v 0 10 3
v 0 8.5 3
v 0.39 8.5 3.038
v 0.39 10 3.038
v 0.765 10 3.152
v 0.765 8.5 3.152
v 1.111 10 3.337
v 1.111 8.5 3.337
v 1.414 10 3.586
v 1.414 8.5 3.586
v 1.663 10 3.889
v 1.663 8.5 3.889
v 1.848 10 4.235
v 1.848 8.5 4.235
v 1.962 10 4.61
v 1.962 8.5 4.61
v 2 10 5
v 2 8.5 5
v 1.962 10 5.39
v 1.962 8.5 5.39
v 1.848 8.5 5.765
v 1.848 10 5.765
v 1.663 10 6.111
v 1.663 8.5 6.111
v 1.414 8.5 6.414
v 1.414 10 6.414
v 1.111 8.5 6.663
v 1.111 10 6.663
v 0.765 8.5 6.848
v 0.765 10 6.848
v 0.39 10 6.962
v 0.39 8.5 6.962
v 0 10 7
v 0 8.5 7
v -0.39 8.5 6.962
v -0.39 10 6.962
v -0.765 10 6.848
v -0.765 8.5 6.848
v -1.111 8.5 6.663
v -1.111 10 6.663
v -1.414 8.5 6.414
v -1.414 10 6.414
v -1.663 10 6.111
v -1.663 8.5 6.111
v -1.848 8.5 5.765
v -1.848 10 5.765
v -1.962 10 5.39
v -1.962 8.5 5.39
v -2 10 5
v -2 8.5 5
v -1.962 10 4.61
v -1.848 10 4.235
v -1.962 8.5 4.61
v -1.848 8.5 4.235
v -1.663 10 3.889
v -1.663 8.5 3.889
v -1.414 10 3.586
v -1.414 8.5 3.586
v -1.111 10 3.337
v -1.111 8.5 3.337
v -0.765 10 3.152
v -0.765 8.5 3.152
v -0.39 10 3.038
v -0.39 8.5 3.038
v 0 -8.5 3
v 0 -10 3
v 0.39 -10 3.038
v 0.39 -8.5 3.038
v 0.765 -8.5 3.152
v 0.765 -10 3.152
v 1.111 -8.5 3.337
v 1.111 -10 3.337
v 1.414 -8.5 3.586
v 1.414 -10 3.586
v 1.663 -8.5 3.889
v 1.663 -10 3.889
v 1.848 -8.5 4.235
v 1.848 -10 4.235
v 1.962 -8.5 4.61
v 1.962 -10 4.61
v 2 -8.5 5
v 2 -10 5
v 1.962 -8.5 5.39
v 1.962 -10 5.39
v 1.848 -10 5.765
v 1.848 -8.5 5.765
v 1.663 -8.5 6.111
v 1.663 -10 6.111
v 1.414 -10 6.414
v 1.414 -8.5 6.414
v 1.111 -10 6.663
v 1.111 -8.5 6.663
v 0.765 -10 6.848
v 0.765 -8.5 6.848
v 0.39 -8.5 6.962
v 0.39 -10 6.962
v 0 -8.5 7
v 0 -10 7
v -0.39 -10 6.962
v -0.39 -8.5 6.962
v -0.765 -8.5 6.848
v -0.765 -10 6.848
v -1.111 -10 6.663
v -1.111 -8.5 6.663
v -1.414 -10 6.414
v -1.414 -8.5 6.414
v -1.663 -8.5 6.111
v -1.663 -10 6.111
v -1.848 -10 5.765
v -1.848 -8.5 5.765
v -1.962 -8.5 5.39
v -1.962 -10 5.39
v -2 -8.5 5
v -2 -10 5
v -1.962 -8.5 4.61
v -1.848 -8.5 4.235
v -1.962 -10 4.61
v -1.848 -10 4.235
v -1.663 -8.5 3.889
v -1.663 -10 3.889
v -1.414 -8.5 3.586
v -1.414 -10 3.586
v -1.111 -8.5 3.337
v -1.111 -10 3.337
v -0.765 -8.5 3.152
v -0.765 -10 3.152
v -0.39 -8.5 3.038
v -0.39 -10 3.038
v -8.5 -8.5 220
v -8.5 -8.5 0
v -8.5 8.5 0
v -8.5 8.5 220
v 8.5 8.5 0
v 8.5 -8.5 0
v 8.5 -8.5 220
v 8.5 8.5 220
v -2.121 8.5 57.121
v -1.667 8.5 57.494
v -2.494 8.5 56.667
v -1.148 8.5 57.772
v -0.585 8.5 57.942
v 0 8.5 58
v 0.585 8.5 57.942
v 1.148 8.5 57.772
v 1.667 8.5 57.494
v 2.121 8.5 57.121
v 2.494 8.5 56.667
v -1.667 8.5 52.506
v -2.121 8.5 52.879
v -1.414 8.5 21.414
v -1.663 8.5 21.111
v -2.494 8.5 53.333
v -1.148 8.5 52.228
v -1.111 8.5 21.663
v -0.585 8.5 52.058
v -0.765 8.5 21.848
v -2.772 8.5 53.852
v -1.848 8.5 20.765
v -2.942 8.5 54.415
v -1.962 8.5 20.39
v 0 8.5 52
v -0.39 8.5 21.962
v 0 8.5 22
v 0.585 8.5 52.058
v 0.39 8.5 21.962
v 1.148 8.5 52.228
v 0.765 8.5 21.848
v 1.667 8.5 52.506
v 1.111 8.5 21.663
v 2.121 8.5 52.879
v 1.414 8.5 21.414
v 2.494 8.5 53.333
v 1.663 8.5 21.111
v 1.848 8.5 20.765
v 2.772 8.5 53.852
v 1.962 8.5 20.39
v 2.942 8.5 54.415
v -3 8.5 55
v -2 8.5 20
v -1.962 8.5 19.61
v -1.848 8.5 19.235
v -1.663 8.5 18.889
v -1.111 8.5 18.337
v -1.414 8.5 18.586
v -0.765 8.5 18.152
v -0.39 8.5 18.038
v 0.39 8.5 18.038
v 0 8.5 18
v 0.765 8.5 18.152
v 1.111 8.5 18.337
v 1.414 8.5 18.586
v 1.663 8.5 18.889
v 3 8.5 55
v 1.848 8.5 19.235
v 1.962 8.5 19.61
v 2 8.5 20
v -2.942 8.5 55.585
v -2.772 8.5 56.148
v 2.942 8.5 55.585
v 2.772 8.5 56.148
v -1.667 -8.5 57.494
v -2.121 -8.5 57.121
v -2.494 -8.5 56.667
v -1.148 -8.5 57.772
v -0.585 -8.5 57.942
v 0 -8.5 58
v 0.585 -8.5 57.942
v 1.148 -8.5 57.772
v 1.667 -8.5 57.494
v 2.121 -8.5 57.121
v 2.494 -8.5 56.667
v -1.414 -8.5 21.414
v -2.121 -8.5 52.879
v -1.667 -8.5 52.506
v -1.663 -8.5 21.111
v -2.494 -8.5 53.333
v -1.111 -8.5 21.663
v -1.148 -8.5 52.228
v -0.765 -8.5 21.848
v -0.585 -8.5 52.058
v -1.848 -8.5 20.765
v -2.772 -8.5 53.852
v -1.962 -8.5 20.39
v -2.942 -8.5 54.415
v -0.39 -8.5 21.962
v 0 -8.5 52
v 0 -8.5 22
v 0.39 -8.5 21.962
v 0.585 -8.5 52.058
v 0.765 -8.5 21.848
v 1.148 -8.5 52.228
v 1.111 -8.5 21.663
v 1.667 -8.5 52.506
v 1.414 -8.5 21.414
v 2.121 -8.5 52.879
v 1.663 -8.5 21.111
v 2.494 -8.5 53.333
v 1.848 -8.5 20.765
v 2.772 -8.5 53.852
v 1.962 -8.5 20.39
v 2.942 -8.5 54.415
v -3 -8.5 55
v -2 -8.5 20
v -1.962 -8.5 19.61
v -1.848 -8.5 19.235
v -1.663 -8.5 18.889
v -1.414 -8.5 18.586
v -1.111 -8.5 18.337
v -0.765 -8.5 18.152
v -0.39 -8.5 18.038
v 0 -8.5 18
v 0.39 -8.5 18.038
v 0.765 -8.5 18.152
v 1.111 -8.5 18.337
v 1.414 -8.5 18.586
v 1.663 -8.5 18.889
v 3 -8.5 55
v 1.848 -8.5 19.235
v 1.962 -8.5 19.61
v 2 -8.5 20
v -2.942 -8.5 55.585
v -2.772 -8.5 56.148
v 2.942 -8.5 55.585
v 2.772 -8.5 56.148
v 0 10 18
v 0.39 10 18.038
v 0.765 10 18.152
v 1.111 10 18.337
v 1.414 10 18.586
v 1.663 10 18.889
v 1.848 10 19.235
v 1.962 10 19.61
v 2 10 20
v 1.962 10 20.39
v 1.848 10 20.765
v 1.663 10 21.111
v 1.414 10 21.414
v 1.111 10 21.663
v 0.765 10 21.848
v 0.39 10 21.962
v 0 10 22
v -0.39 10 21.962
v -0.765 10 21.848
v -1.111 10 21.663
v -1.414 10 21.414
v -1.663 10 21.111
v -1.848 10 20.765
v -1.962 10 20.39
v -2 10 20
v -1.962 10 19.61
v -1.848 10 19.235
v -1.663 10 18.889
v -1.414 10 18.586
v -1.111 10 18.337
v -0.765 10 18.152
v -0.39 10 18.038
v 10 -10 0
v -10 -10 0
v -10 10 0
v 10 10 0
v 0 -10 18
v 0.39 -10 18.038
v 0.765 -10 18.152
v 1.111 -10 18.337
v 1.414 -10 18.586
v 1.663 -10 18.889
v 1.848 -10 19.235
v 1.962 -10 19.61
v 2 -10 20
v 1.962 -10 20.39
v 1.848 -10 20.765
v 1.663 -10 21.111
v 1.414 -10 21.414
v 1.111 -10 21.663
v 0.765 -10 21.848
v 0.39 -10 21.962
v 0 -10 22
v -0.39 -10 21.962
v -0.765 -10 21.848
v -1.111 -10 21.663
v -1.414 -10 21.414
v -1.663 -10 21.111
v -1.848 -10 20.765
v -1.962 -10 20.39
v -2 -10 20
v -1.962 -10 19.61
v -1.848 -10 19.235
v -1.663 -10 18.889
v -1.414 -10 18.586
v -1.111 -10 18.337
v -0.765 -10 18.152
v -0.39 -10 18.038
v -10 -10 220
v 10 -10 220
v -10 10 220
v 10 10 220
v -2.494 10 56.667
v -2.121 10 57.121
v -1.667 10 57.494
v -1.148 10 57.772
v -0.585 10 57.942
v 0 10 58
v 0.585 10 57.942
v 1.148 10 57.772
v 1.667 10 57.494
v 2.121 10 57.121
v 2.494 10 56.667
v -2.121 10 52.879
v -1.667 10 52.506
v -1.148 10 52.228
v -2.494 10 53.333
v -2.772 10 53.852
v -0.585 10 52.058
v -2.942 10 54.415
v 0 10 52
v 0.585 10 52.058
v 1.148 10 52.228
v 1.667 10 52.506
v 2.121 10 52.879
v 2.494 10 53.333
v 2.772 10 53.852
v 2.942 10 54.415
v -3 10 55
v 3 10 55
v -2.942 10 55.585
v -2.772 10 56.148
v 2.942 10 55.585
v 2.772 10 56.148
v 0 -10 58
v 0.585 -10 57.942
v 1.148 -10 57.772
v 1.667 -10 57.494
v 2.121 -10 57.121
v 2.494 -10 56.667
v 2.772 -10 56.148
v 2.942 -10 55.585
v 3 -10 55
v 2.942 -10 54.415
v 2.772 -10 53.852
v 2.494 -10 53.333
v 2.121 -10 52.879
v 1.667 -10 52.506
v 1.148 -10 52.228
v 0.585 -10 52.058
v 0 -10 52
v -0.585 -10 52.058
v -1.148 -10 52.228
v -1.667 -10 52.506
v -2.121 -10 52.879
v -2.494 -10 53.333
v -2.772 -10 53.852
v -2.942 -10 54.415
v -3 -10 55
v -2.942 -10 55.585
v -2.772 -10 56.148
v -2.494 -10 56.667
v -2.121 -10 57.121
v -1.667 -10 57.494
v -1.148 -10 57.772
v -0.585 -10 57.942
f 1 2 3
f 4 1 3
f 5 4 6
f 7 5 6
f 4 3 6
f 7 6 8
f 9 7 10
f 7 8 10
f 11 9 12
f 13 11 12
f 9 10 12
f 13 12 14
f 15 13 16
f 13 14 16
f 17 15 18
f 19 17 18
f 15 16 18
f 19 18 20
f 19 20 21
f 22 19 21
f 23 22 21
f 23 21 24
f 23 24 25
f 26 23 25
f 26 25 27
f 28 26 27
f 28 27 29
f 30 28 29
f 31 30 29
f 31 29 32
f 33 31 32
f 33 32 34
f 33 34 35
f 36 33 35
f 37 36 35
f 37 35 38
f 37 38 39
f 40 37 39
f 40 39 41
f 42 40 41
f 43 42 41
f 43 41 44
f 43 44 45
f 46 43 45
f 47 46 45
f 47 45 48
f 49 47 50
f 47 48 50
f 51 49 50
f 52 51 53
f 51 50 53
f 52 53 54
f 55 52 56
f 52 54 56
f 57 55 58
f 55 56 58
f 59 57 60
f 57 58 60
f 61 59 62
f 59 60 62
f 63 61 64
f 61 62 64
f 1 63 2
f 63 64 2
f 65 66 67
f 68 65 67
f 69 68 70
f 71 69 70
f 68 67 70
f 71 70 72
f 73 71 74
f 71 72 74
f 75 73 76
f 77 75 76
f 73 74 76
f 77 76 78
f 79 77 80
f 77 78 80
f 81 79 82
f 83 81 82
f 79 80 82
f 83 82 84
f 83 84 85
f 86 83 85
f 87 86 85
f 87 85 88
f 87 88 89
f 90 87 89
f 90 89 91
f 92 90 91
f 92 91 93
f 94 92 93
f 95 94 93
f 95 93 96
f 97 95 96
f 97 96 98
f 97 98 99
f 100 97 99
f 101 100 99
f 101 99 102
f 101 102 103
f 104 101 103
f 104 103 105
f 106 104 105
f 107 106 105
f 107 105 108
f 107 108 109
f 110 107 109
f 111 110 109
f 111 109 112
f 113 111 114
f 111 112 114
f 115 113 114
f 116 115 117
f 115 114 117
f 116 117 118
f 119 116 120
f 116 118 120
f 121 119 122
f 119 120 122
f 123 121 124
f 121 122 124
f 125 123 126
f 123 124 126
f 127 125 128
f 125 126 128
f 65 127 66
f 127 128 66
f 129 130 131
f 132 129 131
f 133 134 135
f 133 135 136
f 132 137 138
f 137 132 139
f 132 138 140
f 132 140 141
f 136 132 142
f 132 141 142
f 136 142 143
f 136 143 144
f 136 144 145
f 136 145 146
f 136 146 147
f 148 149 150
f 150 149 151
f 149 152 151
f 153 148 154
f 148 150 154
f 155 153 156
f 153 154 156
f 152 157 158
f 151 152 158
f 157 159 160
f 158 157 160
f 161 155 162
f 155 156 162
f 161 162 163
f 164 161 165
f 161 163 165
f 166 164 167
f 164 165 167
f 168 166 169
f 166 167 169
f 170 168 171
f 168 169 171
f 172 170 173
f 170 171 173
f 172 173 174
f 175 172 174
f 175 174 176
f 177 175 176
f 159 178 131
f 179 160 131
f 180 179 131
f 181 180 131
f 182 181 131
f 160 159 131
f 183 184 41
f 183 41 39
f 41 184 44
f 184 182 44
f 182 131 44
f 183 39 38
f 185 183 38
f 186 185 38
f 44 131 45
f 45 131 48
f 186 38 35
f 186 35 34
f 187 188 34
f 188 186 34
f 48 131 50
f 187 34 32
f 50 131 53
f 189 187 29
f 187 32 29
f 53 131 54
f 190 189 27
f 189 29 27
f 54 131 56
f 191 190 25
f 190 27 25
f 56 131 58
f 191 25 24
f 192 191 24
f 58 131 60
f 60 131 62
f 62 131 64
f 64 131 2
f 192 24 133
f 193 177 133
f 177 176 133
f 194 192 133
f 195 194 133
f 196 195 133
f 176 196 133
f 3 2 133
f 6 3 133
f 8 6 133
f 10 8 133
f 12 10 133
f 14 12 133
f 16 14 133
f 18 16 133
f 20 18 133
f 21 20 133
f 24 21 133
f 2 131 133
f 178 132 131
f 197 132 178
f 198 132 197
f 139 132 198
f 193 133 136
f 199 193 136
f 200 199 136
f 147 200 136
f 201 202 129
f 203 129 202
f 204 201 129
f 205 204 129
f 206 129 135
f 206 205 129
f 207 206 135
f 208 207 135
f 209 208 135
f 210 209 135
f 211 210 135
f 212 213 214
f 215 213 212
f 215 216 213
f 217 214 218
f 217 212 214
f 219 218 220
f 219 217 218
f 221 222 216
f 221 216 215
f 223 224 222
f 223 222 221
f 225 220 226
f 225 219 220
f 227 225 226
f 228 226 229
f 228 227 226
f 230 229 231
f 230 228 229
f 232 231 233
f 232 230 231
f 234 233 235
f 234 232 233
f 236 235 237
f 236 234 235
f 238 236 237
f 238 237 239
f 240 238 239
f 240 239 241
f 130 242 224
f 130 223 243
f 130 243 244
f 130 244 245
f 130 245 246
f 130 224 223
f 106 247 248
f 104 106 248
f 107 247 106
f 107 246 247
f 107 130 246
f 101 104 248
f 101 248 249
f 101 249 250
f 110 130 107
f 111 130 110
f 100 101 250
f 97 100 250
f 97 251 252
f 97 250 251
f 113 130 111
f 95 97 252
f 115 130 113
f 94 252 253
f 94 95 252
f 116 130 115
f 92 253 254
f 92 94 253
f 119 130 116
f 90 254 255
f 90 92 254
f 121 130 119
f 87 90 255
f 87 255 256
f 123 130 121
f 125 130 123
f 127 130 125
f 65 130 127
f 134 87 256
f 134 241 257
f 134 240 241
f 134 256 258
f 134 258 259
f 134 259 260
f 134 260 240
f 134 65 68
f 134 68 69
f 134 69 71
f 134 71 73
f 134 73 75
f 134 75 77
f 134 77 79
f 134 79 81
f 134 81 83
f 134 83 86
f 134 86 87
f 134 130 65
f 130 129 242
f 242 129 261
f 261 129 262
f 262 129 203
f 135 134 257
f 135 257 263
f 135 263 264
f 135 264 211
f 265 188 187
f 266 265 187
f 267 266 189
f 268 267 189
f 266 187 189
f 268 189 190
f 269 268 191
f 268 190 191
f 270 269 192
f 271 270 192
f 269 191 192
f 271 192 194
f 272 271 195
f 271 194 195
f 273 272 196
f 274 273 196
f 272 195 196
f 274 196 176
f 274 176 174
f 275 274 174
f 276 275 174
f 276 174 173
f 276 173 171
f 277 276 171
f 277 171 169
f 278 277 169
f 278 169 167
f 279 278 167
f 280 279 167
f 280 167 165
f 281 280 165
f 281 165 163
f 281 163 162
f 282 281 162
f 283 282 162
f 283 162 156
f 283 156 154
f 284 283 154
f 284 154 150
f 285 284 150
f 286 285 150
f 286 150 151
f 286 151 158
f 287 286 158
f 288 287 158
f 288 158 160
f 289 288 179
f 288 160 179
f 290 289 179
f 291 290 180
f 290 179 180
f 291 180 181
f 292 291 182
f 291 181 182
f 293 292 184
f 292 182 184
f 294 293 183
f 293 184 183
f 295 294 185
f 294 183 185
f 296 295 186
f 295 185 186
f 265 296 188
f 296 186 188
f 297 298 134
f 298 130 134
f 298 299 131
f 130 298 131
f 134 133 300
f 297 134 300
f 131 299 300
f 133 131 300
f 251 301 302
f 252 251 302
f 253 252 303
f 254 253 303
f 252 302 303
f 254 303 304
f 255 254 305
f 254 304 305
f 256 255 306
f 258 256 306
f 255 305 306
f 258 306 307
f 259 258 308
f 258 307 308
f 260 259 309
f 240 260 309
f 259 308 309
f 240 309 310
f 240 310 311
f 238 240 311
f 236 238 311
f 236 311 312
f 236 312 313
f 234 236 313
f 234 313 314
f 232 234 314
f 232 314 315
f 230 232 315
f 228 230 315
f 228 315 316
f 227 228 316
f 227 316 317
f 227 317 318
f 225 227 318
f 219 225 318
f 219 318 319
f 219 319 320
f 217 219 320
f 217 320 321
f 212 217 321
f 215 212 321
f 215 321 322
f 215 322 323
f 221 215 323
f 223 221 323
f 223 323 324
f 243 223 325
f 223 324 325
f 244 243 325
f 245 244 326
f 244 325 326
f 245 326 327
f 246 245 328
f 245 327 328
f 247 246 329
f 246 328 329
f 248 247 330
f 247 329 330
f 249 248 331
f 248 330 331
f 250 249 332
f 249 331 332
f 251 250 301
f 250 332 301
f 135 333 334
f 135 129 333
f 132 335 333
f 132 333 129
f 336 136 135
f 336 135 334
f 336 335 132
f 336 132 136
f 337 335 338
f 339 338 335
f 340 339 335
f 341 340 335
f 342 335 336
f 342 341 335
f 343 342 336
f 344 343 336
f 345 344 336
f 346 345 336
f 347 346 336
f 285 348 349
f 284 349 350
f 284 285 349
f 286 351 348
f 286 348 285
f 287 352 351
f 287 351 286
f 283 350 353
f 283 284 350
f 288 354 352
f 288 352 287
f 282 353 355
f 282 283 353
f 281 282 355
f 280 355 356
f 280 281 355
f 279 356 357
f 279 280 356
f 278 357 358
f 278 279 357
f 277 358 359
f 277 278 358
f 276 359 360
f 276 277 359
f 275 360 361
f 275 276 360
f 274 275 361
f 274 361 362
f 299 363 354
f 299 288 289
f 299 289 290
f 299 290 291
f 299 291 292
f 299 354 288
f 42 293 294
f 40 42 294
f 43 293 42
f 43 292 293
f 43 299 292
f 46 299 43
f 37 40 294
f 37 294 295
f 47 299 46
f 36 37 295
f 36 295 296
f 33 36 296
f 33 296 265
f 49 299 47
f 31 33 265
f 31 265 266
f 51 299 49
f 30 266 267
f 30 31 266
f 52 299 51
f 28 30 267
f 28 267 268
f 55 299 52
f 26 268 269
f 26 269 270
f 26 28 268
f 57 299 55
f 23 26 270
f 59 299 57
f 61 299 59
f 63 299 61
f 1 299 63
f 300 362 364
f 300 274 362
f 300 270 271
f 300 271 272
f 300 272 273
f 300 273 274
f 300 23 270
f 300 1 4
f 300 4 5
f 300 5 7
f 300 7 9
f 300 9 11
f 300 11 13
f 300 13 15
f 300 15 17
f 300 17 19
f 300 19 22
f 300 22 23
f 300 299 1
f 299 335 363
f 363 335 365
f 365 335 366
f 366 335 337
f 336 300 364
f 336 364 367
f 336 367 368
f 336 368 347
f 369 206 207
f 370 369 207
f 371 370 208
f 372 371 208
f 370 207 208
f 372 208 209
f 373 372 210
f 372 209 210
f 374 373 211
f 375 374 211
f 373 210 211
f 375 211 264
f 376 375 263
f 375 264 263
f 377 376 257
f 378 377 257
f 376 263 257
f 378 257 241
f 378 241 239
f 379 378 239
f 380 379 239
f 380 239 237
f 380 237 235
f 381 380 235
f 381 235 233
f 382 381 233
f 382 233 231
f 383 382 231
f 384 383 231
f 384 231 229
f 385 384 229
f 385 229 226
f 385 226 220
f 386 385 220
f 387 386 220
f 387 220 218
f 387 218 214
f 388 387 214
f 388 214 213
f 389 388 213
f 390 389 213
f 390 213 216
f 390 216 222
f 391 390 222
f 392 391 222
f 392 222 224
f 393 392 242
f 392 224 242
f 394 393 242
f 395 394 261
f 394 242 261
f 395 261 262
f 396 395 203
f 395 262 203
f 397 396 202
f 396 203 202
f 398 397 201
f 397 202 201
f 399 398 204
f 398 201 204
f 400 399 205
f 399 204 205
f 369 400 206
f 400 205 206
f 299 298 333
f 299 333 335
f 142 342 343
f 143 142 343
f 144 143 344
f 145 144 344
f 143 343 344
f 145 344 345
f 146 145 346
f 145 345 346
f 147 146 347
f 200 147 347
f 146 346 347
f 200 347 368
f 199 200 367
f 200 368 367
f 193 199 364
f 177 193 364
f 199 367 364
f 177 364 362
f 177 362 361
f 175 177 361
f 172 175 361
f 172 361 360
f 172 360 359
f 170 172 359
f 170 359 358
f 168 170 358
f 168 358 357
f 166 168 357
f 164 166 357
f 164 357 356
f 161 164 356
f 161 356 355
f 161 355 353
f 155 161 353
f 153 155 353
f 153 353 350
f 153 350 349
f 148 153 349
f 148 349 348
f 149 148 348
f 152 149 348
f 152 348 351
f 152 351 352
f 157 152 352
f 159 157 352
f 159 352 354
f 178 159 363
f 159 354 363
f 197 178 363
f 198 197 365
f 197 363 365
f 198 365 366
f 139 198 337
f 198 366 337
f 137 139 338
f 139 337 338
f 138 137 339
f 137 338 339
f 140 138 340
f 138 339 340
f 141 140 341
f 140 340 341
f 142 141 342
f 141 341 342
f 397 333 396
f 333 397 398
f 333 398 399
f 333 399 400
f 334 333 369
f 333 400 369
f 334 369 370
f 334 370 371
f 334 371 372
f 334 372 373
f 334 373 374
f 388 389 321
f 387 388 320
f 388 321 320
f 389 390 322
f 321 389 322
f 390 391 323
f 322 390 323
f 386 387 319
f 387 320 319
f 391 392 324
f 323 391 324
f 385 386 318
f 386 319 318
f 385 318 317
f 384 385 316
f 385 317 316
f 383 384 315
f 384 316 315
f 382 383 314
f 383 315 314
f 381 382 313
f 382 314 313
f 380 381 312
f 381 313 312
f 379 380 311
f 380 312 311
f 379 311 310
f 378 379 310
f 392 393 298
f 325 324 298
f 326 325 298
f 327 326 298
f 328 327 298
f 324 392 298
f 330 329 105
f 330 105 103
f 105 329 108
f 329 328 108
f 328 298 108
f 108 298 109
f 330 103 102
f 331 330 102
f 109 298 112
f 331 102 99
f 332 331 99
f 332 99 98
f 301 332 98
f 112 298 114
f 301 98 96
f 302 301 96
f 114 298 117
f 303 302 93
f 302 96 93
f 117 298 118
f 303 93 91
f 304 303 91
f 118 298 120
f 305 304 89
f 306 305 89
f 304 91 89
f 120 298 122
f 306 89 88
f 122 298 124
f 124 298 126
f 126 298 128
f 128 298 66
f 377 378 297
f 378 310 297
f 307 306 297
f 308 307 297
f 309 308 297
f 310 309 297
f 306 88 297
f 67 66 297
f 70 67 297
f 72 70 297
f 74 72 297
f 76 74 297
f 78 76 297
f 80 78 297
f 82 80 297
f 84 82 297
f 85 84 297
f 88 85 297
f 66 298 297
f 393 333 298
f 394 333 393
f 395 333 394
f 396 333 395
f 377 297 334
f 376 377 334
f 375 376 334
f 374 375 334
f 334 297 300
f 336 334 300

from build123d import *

# Parameters (mm, degrees)
SKETCH_1_W          = 20
SKETCH_1_H          = 20
SKETCH_1_W_2        = 17
SKETCH_1_H_2        = 17
EXTRUDE_1_DEPTH     = 220
SKETCH_3_R          = 2
CUT_EXTRUDE_1_DEPTH = 23
SKETCH_4_R          = 3
CUT_EXTRUDE_2_DEPTH = 222.133443875


with BuildPart() as part:
    # 草图1 → 凸台-拉伸1 (new body)
    with BuildSketch(Plane.XY):
        Rectangle(SKETCH_1_W, SKETCH_1_H)
        Rectangle(SKETCH_1_W_2, SKETCH_1_H_2, mode=Mode.SUBTRACT)
    extrude(amount=EXTRUDE_1_DEPTH)

    # 草图3 → 切除-拉伸1 (cut)
    with BuildSketch(Plane.XZ.offset(10)):
        with Locations(Location((0, 20, 0), (0, 0, 270))):
            Circle(SKETCH_3_R)
        with Locations(Location((0, 5, 0), (0, 0, 270))):
            Circle(SKETCH_3_R)
    extrude(amount=-CUT_EXTRUDE_1_DEPTH, mode=Mode.SUBTRACT)

    # 草图4 → 切除-拉伸2 (cut, through all)
    with BuildSketch(Plane(origin=(0, 10, 0), x_dir=(1, 0, 0), z_dir=(0, 1, 0))):
        with Locations(Location((0, -55, 0), (0, 0, 270))):
            Circle(SKETCH_4_R)
    extrude(amount=-CUT_EXTRUDE_2_DEPTH, mode=Mode.SUBTRACT)


solid = part.part
